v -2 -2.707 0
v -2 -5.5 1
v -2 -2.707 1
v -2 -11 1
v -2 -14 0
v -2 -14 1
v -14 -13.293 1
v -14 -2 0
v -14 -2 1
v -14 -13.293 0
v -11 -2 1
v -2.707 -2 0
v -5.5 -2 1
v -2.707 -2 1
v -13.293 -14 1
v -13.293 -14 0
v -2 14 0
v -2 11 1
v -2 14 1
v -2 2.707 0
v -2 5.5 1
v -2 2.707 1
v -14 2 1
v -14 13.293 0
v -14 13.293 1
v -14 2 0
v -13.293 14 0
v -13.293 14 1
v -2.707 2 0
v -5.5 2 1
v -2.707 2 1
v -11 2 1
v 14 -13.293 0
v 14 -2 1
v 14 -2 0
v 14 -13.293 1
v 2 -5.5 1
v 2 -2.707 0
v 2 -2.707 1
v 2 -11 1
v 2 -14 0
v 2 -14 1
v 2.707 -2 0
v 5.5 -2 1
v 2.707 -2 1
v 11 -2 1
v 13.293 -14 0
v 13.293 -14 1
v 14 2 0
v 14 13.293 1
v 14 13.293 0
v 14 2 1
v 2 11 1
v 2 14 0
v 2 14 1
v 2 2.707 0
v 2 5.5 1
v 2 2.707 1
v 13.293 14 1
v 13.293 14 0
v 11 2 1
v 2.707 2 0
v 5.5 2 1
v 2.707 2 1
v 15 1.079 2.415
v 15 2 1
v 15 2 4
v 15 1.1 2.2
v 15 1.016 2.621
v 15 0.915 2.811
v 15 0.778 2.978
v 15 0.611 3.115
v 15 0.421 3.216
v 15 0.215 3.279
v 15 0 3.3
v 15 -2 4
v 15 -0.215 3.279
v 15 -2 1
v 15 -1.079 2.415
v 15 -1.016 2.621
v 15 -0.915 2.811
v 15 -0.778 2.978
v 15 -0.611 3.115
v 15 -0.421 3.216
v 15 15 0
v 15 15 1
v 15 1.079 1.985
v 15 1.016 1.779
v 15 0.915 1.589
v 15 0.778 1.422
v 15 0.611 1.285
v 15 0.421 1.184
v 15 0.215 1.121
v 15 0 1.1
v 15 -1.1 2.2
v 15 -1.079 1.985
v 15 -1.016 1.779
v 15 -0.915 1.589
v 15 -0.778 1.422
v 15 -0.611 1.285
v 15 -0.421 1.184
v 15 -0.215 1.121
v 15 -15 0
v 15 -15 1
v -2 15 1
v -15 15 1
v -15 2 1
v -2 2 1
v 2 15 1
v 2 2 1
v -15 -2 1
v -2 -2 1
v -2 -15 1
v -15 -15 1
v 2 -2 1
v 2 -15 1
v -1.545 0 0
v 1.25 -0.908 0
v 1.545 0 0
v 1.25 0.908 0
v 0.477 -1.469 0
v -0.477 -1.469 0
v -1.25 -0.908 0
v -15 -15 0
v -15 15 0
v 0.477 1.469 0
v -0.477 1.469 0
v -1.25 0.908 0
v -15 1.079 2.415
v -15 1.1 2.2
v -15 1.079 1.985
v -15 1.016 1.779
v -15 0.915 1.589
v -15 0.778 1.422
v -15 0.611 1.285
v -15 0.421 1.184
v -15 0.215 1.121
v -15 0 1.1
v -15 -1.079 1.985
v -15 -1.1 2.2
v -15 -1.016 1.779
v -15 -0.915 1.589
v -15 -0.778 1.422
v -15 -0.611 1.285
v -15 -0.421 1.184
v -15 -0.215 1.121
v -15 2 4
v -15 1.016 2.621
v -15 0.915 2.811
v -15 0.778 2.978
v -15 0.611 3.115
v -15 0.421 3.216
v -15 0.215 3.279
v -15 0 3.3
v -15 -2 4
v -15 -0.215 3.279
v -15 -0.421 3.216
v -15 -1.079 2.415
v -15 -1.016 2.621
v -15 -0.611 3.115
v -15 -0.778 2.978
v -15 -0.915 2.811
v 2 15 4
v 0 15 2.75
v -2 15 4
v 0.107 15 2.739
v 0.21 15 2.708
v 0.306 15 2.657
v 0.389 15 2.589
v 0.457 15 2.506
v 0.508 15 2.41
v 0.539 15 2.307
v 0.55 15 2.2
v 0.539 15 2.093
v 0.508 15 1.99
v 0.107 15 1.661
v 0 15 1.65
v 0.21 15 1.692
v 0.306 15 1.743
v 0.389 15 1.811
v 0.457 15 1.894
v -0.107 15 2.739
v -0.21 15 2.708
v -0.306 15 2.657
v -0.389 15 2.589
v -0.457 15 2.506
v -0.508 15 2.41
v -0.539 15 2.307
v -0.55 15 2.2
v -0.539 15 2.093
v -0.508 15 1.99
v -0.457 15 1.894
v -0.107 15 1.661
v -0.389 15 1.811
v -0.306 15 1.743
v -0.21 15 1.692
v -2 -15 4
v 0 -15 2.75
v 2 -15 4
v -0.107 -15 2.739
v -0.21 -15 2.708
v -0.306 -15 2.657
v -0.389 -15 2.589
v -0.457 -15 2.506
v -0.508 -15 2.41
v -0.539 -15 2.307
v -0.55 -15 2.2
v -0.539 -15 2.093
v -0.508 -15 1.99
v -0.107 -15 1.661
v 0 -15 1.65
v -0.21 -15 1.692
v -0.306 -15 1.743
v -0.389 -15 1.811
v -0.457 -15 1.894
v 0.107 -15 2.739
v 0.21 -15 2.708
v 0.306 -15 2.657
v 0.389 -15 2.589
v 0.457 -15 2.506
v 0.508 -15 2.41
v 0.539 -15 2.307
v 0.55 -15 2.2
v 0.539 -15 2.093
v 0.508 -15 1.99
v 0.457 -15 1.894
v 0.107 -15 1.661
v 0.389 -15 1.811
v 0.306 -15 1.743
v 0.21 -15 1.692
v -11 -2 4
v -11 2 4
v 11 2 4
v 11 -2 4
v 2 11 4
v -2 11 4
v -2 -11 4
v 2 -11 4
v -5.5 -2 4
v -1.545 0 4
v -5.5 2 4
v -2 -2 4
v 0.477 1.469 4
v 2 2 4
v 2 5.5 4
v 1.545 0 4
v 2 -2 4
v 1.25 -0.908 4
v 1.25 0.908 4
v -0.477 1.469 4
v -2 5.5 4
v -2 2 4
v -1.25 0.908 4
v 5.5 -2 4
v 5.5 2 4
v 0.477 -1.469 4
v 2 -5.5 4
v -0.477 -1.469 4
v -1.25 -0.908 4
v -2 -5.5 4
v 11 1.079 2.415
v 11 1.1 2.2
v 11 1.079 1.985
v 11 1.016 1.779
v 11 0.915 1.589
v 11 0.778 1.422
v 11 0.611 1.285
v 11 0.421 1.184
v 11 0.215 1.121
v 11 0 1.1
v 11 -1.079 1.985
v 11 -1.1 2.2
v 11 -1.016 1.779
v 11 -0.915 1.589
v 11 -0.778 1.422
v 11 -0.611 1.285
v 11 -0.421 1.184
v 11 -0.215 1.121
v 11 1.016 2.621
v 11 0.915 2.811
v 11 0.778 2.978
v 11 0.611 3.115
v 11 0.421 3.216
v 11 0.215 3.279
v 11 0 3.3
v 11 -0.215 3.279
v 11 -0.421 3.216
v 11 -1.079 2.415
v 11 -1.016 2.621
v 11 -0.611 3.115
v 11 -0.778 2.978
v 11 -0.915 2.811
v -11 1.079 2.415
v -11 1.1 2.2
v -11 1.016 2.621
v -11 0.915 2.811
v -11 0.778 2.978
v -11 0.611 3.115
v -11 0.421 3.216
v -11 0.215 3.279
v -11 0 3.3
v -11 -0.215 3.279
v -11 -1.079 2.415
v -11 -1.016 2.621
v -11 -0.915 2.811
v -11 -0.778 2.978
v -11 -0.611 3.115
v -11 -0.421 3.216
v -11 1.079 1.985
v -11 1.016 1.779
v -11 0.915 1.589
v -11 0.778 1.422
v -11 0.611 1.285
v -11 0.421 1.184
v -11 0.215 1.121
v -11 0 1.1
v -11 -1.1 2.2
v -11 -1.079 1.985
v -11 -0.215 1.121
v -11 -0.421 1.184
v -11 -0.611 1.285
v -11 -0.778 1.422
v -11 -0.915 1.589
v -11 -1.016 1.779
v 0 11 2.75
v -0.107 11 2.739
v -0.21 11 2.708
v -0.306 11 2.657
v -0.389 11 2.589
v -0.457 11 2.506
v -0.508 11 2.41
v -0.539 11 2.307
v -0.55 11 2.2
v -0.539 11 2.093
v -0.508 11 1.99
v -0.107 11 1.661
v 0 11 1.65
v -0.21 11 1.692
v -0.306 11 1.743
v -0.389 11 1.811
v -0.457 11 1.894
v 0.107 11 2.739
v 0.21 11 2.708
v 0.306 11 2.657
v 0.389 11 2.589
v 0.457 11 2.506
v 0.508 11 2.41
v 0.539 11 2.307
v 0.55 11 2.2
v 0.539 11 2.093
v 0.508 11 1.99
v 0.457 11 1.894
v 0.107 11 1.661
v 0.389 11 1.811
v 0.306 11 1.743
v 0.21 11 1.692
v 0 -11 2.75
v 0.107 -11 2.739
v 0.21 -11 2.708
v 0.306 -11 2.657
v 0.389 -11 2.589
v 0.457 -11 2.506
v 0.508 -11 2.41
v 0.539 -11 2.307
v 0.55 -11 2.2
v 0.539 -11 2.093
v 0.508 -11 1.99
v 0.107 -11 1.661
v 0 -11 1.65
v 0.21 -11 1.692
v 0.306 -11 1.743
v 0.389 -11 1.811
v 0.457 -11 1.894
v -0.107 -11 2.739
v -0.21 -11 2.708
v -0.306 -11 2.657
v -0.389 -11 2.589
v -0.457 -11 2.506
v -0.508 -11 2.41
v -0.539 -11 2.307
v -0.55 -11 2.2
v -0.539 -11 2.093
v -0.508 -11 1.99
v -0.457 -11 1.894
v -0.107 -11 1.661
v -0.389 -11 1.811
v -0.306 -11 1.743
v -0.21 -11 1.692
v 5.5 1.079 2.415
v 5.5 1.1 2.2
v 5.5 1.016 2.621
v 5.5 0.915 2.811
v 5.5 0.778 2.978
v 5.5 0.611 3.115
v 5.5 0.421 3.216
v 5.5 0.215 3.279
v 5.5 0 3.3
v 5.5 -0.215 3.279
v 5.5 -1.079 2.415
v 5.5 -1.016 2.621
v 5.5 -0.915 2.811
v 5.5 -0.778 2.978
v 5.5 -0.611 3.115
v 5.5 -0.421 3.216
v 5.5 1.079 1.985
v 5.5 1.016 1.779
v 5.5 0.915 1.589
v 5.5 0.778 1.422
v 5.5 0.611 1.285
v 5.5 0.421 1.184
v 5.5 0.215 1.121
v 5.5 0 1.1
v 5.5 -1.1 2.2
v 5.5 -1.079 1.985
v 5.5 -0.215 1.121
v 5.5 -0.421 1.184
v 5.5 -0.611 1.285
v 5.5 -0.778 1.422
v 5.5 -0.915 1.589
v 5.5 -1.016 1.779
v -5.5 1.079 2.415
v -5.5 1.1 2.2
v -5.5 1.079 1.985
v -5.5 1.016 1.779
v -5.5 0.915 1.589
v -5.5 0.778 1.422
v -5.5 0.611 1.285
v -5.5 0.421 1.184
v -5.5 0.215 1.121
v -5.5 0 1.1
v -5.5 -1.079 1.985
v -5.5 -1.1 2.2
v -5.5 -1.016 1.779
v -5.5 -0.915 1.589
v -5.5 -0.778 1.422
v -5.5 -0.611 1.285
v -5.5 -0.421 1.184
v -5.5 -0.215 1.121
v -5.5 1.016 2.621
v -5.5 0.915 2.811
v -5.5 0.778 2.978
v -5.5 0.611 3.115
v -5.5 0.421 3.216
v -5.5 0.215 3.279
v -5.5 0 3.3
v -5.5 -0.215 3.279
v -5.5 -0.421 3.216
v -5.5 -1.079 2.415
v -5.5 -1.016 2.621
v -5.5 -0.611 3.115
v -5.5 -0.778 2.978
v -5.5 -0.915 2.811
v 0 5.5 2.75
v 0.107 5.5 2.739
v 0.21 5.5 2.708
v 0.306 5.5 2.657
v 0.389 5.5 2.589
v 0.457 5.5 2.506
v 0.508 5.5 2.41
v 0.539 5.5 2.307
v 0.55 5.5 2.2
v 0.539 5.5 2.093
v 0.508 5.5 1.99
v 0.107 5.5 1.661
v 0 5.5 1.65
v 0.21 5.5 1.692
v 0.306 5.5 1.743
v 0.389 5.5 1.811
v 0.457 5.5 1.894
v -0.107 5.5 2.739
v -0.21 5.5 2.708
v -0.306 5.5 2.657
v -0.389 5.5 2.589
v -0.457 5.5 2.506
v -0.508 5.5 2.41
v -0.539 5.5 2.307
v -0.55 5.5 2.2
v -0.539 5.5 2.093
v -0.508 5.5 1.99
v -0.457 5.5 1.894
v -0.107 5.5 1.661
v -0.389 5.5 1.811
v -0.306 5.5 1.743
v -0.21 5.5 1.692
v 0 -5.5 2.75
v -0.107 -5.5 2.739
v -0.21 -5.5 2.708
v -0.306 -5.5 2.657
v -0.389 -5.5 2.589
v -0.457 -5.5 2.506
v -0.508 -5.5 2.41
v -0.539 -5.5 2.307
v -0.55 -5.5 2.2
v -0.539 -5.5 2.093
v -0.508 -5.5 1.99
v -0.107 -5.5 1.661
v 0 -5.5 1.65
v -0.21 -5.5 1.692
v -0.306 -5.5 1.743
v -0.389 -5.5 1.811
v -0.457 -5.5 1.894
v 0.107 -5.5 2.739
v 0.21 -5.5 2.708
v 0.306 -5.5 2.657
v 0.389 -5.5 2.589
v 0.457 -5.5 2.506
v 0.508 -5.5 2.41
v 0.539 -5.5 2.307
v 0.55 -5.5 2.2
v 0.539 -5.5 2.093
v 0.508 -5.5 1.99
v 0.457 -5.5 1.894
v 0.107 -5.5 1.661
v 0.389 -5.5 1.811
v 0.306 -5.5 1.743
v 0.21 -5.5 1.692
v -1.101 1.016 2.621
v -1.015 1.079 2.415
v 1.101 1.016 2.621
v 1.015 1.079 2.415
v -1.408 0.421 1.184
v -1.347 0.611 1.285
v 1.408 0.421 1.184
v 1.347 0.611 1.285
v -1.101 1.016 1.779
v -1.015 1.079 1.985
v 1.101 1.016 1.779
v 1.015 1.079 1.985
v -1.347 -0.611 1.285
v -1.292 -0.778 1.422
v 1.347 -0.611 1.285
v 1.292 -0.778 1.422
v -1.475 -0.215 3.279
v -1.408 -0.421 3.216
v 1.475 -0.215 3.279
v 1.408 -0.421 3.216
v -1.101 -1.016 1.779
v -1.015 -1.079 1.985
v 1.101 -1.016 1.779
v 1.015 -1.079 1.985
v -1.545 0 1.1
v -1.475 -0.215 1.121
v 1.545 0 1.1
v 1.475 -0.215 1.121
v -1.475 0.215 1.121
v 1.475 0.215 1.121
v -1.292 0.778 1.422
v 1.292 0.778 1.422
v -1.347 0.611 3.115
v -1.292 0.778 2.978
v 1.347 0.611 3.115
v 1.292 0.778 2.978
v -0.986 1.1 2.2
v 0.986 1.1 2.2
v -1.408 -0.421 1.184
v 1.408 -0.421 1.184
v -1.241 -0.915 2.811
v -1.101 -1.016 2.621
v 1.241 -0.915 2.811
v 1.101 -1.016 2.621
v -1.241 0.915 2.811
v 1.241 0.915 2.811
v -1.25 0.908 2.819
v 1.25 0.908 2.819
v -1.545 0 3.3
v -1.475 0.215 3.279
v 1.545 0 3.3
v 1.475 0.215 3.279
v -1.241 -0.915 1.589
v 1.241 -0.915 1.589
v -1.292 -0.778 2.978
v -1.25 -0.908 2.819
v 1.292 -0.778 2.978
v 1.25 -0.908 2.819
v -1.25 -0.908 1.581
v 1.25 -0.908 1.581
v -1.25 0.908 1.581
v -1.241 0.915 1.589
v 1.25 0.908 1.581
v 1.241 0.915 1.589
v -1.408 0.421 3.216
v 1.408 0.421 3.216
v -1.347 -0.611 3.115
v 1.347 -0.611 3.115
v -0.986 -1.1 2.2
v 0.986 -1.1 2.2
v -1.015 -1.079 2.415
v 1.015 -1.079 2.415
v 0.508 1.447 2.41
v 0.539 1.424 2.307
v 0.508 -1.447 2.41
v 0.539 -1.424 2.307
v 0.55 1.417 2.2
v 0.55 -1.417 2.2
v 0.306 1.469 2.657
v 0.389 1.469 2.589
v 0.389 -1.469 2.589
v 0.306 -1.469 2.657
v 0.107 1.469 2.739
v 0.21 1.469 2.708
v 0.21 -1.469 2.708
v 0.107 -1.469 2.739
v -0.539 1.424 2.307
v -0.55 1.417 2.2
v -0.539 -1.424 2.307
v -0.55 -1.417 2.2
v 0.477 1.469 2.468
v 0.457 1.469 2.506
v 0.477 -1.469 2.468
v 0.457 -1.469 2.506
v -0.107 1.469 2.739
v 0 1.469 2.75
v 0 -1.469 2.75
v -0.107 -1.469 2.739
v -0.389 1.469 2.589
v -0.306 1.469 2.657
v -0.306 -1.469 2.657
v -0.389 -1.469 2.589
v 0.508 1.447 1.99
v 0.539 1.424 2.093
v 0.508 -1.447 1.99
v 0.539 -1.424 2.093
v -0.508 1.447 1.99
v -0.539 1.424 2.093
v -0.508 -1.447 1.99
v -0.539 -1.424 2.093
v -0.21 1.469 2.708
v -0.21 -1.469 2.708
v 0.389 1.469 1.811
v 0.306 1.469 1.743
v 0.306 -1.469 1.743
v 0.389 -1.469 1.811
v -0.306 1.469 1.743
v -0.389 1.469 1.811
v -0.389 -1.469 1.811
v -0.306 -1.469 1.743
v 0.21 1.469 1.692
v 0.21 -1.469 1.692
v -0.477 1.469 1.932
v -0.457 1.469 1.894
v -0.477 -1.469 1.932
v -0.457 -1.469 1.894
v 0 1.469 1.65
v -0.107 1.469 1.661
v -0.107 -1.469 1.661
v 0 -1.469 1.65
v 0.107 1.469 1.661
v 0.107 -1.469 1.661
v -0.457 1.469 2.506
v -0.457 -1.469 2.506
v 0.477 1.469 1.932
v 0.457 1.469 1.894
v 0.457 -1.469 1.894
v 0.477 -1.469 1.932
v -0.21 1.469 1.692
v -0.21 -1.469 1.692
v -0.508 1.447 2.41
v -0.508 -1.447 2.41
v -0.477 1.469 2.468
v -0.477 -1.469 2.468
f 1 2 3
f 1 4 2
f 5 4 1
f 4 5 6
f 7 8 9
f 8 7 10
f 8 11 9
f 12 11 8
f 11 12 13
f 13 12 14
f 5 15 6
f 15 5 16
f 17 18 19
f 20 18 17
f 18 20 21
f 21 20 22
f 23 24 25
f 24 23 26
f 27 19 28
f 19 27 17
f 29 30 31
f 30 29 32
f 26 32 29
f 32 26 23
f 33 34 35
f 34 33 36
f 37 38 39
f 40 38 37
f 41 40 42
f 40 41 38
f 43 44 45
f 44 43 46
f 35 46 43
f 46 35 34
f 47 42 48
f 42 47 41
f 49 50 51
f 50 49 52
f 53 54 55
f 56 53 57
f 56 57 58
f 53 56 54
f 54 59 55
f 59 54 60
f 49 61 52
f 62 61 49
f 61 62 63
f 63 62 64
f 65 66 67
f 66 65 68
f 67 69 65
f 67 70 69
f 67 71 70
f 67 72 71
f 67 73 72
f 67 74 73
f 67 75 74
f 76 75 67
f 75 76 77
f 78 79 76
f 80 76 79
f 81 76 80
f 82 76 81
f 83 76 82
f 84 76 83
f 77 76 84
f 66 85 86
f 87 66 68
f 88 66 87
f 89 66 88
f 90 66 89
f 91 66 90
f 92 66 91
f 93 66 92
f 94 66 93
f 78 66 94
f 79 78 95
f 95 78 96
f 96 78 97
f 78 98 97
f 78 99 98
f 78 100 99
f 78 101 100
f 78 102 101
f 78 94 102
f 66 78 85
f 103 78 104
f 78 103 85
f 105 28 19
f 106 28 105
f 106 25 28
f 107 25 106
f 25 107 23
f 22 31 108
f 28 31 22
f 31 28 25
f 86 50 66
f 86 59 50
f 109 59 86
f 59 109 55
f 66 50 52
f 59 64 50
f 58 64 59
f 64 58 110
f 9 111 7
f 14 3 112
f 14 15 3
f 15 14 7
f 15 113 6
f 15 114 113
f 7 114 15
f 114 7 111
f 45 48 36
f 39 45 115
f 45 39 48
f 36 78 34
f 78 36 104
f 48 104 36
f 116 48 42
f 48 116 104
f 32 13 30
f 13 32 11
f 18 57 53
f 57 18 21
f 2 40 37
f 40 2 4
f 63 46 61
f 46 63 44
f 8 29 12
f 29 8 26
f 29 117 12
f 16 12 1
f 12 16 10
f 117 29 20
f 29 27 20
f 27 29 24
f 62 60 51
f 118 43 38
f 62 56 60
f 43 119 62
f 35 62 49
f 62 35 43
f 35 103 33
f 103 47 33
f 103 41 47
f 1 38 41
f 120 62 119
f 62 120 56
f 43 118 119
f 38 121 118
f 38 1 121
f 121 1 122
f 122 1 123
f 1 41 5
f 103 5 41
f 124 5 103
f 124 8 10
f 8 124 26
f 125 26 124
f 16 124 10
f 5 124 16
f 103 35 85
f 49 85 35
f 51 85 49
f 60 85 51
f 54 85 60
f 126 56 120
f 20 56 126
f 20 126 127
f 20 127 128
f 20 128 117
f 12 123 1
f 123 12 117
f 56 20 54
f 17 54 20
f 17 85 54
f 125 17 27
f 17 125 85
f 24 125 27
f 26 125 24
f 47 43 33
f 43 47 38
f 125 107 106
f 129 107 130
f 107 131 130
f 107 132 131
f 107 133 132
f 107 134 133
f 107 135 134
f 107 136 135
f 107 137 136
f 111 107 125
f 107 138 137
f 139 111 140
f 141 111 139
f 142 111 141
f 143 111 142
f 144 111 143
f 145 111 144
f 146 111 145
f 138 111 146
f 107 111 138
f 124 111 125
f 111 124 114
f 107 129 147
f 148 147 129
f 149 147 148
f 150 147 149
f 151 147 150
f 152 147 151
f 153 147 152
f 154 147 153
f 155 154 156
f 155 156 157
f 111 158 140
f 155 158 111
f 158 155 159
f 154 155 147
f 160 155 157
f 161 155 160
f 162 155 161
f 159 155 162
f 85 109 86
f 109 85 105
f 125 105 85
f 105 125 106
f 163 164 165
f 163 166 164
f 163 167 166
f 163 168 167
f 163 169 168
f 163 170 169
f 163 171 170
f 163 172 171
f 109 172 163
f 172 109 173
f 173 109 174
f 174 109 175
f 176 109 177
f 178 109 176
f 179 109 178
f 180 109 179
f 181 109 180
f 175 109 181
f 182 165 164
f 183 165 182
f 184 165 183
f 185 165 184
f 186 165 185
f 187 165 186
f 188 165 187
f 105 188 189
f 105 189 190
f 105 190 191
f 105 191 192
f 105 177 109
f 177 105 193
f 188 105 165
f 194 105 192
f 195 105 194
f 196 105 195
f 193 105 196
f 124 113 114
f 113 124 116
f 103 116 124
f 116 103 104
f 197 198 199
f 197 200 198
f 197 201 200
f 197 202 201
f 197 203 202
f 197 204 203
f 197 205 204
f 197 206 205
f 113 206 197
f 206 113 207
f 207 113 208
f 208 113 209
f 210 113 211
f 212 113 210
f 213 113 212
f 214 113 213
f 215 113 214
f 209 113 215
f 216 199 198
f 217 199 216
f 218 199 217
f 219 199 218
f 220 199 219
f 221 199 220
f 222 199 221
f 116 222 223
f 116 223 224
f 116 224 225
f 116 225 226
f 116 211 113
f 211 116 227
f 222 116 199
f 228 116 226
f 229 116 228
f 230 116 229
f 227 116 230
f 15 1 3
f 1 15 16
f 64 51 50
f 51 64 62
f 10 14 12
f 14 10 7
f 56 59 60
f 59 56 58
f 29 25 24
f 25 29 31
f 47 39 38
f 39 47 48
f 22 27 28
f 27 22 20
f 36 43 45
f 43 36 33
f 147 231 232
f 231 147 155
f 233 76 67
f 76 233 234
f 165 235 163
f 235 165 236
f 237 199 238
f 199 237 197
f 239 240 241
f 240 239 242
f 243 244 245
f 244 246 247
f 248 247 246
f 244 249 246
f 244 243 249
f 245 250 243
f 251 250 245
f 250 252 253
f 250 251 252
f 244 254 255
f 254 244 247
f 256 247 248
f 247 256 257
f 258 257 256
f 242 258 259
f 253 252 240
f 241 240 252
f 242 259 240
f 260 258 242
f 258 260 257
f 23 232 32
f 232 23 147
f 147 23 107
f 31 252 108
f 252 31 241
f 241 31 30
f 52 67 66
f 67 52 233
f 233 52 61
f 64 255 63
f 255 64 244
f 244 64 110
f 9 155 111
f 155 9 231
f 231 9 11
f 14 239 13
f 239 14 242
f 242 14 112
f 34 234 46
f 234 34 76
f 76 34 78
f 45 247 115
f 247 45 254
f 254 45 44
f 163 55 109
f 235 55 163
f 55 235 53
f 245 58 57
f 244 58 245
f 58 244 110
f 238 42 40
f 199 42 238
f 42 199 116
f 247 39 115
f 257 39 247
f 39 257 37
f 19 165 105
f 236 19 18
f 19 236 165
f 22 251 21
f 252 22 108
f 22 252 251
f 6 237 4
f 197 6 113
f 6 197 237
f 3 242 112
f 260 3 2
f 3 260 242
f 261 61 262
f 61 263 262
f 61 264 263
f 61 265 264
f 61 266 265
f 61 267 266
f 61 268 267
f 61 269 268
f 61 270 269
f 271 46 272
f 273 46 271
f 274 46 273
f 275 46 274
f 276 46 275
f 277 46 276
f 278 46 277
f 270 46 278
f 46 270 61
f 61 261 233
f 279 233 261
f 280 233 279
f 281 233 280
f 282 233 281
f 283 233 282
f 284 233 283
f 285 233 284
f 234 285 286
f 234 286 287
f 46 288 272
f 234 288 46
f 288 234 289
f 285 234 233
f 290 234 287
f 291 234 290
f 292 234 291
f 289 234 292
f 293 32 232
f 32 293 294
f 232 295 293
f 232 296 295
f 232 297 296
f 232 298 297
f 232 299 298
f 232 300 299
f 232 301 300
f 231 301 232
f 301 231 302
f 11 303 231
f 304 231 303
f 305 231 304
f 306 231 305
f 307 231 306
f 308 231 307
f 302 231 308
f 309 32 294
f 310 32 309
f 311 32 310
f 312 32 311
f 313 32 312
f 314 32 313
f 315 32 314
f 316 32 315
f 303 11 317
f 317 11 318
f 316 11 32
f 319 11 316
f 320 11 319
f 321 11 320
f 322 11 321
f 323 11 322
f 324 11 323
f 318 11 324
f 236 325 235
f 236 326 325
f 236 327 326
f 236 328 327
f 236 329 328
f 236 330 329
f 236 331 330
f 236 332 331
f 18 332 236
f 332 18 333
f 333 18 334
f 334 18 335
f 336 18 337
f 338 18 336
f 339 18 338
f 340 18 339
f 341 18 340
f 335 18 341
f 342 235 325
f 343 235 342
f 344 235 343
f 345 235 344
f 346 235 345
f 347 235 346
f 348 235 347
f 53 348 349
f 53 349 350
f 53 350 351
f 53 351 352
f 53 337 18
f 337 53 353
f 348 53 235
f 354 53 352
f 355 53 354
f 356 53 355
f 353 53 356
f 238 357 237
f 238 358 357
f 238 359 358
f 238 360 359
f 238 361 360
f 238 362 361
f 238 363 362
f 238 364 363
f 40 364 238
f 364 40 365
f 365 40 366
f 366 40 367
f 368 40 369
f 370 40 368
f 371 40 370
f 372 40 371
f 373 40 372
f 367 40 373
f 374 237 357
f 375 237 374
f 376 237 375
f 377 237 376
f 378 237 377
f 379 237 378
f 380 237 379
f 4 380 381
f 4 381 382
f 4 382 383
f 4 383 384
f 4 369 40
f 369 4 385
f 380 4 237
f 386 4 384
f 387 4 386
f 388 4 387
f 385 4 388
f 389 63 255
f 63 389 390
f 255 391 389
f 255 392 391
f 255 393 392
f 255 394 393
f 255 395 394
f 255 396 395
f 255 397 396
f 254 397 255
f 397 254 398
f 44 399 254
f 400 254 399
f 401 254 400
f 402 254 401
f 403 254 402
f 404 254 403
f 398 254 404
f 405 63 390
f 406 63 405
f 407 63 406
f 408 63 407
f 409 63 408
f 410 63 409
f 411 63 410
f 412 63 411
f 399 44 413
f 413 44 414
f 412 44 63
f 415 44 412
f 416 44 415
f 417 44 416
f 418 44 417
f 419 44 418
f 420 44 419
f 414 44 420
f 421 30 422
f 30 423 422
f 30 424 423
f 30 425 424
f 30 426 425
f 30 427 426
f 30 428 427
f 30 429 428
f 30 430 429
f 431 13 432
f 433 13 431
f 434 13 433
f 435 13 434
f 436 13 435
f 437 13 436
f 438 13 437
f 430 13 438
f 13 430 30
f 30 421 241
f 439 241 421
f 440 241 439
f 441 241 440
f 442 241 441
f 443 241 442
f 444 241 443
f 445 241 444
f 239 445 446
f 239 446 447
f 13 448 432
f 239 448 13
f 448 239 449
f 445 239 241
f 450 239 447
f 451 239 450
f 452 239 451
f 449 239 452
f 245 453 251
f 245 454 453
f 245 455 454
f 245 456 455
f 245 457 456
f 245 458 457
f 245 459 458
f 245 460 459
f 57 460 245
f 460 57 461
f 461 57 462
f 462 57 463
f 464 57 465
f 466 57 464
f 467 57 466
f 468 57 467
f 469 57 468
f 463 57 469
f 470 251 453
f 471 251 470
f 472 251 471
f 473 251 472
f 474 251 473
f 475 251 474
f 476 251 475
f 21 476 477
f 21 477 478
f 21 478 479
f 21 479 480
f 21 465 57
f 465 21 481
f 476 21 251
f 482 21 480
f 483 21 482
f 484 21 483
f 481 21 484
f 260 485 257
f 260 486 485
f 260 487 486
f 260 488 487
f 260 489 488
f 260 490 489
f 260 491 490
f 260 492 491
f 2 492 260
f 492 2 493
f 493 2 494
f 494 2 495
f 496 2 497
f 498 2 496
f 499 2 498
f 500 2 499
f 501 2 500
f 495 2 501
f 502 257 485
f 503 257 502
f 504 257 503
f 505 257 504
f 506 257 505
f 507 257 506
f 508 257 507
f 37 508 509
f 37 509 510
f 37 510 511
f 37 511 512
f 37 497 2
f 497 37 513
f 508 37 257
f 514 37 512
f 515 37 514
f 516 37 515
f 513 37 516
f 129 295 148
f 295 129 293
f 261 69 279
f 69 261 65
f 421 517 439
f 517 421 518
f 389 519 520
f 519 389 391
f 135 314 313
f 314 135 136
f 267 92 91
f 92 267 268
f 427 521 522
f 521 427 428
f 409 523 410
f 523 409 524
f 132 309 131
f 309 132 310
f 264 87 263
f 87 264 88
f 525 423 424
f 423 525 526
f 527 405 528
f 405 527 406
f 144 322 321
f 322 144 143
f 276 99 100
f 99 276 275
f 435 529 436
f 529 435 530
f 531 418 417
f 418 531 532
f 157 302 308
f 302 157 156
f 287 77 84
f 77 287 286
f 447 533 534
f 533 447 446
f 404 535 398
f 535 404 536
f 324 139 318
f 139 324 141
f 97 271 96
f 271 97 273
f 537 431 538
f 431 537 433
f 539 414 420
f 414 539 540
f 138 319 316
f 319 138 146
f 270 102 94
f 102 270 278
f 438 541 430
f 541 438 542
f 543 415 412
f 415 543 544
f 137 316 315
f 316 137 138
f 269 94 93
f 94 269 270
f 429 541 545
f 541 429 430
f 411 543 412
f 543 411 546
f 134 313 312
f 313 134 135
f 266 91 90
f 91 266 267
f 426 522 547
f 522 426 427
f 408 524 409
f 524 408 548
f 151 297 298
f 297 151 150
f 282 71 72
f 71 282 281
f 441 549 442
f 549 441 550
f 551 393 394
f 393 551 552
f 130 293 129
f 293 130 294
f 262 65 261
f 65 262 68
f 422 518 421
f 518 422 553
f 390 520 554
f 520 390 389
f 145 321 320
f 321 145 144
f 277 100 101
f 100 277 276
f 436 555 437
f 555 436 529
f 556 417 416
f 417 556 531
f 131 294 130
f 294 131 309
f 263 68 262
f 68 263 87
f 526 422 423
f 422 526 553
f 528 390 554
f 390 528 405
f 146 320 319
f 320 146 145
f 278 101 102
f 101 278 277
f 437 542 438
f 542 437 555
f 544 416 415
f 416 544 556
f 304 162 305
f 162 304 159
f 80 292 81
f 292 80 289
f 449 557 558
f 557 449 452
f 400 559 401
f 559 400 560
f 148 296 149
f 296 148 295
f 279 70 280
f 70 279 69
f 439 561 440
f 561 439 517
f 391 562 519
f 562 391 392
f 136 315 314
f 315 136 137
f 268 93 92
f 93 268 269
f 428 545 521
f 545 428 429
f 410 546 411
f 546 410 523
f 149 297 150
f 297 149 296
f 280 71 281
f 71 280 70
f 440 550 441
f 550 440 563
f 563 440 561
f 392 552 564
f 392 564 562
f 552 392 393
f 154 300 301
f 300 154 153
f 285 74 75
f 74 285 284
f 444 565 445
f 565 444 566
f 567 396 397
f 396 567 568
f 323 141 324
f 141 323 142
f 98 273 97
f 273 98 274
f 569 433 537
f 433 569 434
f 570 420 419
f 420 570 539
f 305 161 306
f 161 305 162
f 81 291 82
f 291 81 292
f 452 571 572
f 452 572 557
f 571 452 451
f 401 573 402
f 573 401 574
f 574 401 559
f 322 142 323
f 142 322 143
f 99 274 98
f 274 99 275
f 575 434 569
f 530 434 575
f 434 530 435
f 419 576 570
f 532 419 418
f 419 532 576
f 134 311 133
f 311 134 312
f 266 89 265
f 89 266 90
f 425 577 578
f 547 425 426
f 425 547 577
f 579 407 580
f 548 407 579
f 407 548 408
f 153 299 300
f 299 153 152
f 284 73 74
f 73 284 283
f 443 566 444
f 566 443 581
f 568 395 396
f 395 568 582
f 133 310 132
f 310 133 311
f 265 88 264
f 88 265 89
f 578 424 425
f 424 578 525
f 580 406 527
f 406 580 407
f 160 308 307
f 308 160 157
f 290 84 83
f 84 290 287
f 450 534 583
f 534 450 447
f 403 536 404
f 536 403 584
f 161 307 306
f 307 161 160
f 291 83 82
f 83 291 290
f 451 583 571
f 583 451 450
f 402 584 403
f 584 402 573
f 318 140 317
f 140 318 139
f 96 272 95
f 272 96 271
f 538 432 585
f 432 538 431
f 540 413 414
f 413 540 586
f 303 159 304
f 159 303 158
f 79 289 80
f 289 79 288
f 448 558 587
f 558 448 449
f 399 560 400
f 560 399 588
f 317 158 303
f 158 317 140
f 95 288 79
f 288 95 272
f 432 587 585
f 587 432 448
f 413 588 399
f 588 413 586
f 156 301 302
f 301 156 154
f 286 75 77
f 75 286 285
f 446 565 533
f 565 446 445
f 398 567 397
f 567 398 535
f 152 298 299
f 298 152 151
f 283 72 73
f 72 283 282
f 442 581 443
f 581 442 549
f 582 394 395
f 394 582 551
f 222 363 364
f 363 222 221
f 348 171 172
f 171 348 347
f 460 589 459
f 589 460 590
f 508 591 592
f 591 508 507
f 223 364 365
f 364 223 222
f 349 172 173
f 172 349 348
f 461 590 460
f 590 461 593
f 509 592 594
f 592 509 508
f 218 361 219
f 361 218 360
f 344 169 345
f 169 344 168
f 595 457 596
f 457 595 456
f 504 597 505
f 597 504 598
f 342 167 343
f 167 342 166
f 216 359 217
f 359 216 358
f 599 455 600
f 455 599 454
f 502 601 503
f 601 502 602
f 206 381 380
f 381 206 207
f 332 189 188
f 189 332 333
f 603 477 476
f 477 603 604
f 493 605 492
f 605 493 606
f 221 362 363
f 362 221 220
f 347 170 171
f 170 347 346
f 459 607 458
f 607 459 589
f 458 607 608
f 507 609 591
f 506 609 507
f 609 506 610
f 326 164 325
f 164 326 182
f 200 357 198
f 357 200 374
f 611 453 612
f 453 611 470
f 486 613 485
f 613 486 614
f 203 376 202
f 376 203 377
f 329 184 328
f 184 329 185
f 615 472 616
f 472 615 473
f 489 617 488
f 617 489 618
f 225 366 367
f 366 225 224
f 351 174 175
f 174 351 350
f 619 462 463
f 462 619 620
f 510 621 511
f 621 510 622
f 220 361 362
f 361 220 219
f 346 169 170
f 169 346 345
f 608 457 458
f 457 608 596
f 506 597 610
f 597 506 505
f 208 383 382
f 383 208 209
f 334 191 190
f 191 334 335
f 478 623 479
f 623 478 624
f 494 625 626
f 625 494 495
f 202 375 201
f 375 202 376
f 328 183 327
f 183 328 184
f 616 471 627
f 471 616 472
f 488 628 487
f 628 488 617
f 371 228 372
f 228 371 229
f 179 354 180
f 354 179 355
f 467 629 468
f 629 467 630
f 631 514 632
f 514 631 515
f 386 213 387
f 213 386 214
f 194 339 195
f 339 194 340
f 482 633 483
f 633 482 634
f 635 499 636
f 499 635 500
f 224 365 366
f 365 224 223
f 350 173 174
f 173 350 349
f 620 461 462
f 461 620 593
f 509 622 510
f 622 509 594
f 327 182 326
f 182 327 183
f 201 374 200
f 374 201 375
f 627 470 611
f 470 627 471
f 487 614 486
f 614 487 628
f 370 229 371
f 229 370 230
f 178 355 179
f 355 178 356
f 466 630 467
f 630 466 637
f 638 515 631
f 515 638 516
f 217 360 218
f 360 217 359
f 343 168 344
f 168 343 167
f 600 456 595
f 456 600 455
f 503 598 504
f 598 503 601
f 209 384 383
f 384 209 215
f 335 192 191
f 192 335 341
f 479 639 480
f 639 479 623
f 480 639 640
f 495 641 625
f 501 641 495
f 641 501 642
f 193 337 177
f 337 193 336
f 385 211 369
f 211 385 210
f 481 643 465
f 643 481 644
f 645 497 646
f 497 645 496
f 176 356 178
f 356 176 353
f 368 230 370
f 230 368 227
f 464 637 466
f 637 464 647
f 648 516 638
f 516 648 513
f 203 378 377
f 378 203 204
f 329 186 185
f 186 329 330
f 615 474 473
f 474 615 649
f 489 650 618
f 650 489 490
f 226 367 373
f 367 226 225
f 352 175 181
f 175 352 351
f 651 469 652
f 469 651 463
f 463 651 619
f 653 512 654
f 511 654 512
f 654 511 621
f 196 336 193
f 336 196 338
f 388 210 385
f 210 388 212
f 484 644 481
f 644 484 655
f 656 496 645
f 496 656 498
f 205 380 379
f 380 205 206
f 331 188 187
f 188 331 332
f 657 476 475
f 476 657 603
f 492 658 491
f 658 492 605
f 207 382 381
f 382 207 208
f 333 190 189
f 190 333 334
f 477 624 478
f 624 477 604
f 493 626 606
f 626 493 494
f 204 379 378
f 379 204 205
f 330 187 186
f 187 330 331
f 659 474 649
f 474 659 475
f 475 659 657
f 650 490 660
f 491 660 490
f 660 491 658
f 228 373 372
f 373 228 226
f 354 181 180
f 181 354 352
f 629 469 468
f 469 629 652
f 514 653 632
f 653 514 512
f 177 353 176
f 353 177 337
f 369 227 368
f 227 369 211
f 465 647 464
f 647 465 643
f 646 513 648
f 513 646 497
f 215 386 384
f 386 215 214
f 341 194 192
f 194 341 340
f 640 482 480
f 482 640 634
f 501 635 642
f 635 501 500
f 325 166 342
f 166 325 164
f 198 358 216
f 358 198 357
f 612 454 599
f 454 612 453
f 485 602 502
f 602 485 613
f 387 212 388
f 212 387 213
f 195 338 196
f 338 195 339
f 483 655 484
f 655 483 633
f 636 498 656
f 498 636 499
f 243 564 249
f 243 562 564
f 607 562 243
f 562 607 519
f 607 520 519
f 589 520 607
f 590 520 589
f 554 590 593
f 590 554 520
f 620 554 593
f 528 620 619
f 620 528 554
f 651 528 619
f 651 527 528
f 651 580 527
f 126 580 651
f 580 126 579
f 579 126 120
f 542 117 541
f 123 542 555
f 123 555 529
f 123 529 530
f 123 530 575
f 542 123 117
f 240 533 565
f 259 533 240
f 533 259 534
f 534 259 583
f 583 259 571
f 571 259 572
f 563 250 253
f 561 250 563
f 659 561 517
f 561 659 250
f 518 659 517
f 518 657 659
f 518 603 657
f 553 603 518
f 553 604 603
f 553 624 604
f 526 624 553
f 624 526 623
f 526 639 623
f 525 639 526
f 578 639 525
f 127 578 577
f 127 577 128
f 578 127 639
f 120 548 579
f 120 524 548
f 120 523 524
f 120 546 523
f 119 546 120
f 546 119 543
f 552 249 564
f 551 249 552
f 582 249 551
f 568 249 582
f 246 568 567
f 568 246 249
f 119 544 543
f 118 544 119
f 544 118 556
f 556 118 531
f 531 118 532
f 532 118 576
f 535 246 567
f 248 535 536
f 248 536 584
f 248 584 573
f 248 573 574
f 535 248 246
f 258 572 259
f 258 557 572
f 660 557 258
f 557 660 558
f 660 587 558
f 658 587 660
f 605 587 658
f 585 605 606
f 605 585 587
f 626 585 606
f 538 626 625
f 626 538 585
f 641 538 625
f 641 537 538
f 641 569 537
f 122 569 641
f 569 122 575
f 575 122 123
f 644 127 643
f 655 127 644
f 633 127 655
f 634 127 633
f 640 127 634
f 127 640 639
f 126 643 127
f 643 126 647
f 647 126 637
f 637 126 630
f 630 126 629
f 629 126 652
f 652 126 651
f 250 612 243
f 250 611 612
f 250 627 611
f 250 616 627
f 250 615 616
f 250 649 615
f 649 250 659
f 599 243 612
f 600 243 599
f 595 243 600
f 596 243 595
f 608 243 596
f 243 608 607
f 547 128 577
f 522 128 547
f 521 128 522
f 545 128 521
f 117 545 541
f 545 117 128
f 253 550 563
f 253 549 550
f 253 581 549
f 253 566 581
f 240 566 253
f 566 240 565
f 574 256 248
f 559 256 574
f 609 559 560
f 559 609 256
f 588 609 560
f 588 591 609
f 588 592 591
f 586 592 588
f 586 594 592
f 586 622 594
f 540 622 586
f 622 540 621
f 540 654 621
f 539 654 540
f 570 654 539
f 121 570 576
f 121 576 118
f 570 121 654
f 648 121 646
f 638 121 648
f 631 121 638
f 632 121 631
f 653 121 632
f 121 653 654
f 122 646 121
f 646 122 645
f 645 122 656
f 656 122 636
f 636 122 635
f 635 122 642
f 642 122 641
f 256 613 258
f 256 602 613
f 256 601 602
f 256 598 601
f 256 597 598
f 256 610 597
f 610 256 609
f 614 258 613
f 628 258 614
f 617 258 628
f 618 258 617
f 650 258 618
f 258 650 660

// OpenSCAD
width = 30;
height = 1;

middle_width = 4;
outer_width = 1;
strobe_width = 1;

tube_height = 3;
hole_diameter = 2.2;
middle_hole_diameter = 2.5;
outer_tube_length = 8;
inner_tube_length = 7;
tube_faces = 32;

inner_size = middle_width + inner_tube_length;
outer_size = width - outer_tube_length;


cube_size = (width - outer_width * 2 - middle_width) /2;

//thanks to nophead http://hydraraptor.blogspot.de/2011/02/polyholes.html
module polyhole(h, d) {
    n = max(round(2 * d),3);
    rotate([0,0,180])
        cylinder(h = h, r = (d / 2) / cos (180 / n), $fn = n*2);
}


module groundPlate(){

union(){
	difference(){
		cube([width, width, height]);

	
		for(i = [0, 1]){
			for(j = [0, 1]){
				union(){
					translate([outer_width + i* (cube_size + middle_width),outer_width + j * (cube_size + middle_width),-1]){
						cube([cube_size, cube_size, height + 2]);
					}
				}
			}
		}
	}

	for(i = [-1, 1]){
		translate([width/2, width/2, height/2])  rotate(a = 45 *i, v =[0,0,1])  cube([strobe_width, width * sqrt(2) - strobe_width *2 , height], center =true);
	}

}

}


module tubes(){

difference(){
	translate([0,0,height]){
		union(){
			translate([0, width/2 - middle_width/2, 0])cube([width, middle_width,tube_height]);
			translate([width/2 - middle_width/2, 0, 0]) cube([middle_width, width,tube_height]);
		}
	}

translate([-5,width/2,height + tube_height*0.8/2]) rotate(a=90, v=[0,1,0]) cylinder(h =width +10, r = hole_diameter /2, $fn = tube_faces)	;
translate([width/2,width +5,height + tube_height*0.8/2]) rotate(a=90, v=[1,0,0]) cylinder(h = width + 10, d = hole_diameter /2, $fn = tube_faces);

	translate([width/2,width/2,0]){
		difference(){
			cube([outer_size, outer_size,20], center = true);
			
			cube([inner_size , inner_size,30], center = true);
		}
	}

}
}



translate([-15,-15,0]) {
	difference(){
		union(){
			groundPlate();
			tubes();
		}
		translate([width/2,width/2,-1]){
			polyhole(h=height + tube_height + 5, d = middle_hole_diameter);
		}
	}



}
